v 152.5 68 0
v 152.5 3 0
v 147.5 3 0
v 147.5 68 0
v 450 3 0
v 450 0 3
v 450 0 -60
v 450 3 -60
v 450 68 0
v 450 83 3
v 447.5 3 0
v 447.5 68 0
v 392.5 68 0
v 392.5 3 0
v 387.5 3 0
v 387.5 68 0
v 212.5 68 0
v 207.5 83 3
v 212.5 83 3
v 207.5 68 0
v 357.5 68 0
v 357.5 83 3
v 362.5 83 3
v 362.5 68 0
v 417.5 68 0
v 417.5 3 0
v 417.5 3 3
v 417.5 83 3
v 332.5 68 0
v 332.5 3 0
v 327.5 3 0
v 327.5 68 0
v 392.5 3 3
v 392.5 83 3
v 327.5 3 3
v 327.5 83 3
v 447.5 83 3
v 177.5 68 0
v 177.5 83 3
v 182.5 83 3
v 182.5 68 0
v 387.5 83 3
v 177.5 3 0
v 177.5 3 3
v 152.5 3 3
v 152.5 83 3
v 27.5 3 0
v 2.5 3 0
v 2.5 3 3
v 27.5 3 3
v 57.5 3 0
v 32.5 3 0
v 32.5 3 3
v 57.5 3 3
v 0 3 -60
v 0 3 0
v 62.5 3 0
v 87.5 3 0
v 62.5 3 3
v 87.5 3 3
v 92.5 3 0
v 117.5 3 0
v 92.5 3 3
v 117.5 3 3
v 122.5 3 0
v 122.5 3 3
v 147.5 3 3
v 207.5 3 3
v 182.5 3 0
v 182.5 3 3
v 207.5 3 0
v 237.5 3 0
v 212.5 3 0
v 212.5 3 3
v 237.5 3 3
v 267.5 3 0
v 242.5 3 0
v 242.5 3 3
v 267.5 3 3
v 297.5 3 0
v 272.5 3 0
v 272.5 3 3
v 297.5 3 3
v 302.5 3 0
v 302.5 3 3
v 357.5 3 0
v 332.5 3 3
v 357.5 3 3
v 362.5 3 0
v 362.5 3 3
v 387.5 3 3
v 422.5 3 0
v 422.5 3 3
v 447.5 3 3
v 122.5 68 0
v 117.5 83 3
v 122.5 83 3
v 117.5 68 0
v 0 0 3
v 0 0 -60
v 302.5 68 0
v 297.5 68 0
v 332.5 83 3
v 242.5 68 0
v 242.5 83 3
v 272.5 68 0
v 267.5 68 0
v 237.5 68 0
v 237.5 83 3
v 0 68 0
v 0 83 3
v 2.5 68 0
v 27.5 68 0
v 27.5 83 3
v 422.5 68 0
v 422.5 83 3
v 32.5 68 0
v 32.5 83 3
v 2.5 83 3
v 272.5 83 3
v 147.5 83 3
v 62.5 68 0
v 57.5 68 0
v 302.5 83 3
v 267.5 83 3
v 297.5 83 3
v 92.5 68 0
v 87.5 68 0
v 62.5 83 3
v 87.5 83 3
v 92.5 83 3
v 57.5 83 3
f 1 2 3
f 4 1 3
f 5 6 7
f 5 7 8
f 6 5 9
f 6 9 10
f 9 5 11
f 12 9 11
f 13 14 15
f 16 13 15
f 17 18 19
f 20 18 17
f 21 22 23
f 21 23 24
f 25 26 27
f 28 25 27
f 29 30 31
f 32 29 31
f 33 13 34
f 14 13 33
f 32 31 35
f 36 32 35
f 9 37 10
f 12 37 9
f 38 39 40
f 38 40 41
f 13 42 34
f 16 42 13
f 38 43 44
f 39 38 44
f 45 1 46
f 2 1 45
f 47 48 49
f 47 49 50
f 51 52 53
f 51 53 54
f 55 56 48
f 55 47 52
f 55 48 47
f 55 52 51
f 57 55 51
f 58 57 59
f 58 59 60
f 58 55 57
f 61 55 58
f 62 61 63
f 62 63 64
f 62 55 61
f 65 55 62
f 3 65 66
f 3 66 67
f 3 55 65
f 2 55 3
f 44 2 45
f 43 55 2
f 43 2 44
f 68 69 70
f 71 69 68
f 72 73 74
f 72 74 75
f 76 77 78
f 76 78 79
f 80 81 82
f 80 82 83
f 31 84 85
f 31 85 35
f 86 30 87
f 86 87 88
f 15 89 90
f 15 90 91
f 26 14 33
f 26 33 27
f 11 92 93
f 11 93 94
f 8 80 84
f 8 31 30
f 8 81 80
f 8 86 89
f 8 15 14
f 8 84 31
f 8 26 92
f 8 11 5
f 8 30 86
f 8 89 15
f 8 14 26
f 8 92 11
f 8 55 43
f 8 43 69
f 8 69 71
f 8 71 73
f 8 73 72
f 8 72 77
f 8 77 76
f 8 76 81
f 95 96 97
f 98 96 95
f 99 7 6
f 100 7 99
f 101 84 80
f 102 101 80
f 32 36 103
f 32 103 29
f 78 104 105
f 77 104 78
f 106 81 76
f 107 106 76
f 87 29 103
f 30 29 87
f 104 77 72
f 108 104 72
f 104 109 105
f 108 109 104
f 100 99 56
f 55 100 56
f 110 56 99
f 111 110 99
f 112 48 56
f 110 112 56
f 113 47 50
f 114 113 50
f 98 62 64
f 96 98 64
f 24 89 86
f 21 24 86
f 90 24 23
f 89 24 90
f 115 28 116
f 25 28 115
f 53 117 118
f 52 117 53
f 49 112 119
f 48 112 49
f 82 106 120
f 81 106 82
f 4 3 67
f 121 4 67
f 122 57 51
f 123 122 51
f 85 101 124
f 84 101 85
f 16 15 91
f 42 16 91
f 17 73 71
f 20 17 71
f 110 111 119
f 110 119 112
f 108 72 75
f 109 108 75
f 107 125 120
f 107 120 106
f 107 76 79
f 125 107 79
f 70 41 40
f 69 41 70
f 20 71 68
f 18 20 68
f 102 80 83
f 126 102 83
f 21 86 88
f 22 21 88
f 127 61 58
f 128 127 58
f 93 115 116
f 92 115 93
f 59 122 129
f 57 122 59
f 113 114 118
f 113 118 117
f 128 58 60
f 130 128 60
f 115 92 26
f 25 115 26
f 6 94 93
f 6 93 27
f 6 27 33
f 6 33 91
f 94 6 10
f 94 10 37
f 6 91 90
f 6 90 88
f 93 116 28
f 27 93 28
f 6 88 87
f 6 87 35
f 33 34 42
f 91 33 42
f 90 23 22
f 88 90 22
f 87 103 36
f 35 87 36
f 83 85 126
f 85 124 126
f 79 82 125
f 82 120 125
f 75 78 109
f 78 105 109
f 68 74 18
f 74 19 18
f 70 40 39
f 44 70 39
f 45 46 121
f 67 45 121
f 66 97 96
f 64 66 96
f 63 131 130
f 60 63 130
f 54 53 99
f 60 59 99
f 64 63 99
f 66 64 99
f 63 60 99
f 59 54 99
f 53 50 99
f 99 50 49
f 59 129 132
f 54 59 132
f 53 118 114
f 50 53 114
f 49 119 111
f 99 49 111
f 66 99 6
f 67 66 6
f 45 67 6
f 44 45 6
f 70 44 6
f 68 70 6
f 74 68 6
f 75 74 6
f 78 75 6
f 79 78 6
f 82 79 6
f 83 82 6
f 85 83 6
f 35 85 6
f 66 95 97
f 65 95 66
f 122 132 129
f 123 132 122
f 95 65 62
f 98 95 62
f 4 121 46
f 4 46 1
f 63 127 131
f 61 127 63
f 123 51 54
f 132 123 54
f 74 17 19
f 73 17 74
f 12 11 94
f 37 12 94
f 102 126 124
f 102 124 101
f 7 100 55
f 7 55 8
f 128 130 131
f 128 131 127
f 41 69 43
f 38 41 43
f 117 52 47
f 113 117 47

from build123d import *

# Parameters (mm, degrees)
SKETCH_1_W          = 450
SKETCH_1_H          = 60
EXTRUDE_1_DEPTH     = 3
EXTRUDE_2_DEPTH     = 3
CUT_EXTRUDE_1_DEPTH = 462.507313051


with BuildPart() as part:
    # 草图1 → 凸台-拉伸1 (new body)
    with BuildSketch(Plane(origin=(0, 0, 0), x_dir=(1, 0, 0), z_dir=(0, 1, 0))):
        with Locations((225, 30)):
            Rectangle(SKETCH_1_W, SKETCH_1_H)
    extrude(amount=EXTRUDE_1_DEPTH)

    # 草图3 → 凸台-拉伸2 (add)
    with BuildSketch(Plane.XY):
        Polygon((0, 0), (0, 83), (2.5, 83), (2.5, 3), (27.5, 3), (27.5, 83), (32.5, 83), (32.5, 3), (57.5, 3), (57.5, 83), (62.5, 83), (62.5, 3), (87.5, 3), (87.5, 83), (92.5, 83), (92.5, 3), (117.5, 3), (117.5, 83), (122.5, 83), (122.5, 3), (147.5, 3), (147.5, 83), (152.5, 83), (152.5, 3), (177.5, 3), (177.5, 83), (182.5, 83), (182.5, 3), (207.5, 3), (207.5, 83), (212.5, 83), (212.5, 3), (237.5, 3), (237.5, 83), (242.5, 83), (242.5, 3), (267.5, 3), (267.5, 83), (272.5, 83), (272.5, 3), (297.5, 3), (297.5, 83), (302.5, 83), (302.5, 3), (327.5, 3), (327.5, 83), (332.5, 83), (332.5, 3), (357.5, 3), (357.5, 83), (362.5, 83), (362.5, 3), (387.5, 3), (387.5, 83), (392.5, 83), (392.5, 3), (417.5, 3), (417.5, 83), (422.5, 83), (422.5, 3), (447.5, 3), (447.5, 83), (450, 83), (450, 3), (450, 0), align=None)
    extrude(amount=EXTRUDE_2_DEPTH)

    # 草图4 → 切除-拉伸1 (cut, through all)
    with BuildSketch(Plane.ZY):
        Polygon((3, 83), (0, 68), (0, 83), align=None)
    extrude(amount=-CUT_EXTRUDE_1_DEPTH, mode=Mode.SUBTRACT)


solid = part.part
